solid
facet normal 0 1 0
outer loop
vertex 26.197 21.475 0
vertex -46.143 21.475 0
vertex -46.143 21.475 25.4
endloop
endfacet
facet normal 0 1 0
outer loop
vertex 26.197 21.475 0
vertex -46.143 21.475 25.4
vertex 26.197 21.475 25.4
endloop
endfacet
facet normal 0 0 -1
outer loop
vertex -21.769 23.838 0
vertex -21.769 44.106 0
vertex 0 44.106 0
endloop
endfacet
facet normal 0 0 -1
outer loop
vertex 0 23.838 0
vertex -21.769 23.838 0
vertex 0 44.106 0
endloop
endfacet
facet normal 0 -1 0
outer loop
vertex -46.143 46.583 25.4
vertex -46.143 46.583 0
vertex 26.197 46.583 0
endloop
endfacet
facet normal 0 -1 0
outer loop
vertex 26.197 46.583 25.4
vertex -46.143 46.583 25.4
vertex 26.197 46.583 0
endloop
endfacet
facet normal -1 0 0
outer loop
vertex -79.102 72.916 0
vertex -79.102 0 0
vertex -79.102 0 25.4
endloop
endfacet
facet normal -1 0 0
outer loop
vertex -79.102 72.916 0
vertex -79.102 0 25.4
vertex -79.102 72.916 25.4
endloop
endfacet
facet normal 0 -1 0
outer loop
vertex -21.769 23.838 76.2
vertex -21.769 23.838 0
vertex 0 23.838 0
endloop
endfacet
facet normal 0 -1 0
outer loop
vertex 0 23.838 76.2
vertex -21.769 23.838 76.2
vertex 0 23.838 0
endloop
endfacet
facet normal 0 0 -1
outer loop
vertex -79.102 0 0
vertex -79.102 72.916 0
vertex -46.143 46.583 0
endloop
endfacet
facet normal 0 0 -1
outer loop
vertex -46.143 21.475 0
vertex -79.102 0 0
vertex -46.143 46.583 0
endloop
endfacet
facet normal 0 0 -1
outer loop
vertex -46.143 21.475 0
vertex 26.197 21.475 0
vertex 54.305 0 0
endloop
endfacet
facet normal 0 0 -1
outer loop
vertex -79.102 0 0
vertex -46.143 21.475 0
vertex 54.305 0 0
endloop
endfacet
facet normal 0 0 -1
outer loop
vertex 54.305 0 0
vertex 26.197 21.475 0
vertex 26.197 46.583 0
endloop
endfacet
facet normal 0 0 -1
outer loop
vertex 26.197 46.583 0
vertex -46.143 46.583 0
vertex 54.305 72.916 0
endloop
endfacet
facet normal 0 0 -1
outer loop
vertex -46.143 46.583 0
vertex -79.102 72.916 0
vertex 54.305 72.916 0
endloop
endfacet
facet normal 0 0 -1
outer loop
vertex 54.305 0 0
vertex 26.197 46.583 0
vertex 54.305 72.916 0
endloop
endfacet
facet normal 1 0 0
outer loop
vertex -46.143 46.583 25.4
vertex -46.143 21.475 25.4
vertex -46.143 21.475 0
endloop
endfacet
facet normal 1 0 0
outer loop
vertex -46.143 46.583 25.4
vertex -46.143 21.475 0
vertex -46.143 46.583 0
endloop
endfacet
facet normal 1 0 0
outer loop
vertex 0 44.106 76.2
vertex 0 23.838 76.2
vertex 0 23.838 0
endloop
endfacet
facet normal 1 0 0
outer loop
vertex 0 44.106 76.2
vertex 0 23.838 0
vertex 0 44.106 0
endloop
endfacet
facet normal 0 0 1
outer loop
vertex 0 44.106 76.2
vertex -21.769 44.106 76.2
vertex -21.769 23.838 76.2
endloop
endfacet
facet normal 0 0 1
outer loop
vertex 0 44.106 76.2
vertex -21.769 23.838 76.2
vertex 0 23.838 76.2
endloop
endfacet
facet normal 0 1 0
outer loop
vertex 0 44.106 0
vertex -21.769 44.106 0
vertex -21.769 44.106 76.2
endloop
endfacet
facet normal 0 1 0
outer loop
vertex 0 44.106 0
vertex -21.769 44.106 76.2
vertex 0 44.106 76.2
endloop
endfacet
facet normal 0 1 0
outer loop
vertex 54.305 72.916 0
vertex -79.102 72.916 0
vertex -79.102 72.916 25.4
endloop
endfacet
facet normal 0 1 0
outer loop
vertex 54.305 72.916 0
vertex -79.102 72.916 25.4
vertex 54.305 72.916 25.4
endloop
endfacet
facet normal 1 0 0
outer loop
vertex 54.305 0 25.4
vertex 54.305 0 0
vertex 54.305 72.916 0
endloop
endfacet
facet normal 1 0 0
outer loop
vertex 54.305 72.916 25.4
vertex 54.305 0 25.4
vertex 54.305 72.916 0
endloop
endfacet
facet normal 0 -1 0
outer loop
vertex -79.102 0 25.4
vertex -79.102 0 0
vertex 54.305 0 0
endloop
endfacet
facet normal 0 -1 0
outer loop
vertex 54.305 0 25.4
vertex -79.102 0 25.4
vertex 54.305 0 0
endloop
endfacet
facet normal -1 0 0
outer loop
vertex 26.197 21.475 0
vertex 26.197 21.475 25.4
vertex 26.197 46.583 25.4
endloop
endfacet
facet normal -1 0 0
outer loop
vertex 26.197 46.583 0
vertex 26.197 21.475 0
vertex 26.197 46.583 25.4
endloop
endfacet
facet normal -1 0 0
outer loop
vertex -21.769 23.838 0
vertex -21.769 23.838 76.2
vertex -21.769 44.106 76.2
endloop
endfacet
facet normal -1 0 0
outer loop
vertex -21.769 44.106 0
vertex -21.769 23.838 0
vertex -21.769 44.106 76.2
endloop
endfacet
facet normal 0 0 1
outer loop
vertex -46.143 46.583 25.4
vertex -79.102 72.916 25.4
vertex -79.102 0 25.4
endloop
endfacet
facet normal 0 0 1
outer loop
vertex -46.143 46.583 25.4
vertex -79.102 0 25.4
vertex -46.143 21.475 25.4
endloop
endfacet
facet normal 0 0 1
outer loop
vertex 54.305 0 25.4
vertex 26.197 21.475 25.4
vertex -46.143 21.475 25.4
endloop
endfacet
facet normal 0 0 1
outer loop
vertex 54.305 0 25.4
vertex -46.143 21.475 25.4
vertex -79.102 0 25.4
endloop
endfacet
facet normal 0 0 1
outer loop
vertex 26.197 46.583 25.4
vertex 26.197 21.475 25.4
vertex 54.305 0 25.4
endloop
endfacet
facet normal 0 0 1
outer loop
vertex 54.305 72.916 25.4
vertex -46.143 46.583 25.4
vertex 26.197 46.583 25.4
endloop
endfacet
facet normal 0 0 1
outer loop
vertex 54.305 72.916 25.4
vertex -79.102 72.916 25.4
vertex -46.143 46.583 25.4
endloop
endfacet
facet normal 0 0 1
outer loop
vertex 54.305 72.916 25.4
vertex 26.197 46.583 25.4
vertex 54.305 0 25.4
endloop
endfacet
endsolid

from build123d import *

# Parameters (mm, degrees)
F0_W     = 133.407533
F0_H     = 72.915666
F0_W_2   = 72.340451
F0_H_2   = 25.107652
F1_DEPTH = 25.4
F2_W     = 21.769044
F2_H     = 20.267747
F3_DEPTH = 76.2


with BuildPart() as f1:
    # F0 (on Top) → F1 (new body)
    with BuildSketch(Plane.XY):
        with Locations((-12.39857, 36.457833)):
            Rectangle(F0_W, F0_H)
        with Locations((-9.972829, 34.028918)):
            Rectangle(F0_W_2, F0_H_2, mode=Mode.SUBTRACT)
    extrude(amount=F1_DEPTH)


with BuildPart() as f3:
    # F2 (on Top) → F3 (new body)
    with BuildSketch(Plane.XY):
        with Locations((-10.884522, 33.971795)):
            Rectangle(F2_W, F2_H)
    extrude(amount=F3_DEPTH)


solid = Compound([f1.part, f3.part])
